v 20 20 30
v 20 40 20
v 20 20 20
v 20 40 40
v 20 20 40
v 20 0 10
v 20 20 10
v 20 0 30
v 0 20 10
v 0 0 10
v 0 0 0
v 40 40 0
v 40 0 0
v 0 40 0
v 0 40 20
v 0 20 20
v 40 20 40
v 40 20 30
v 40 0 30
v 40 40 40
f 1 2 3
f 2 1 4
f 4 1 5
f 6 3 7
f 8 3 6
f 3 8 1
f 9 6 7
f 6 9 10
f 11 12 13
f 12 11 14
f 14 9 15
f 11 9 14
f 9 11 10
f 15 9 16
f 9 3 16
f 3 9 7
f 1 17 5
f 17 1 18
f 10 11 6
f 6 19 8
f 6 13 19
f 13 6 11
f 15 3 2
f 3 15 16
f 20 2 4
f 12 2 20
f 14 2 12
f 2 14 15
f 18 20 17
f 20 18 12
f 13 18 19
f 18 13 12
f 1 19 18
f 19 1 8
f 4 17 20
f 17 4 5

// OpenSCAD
cube([20,20,10]);
translate([0,20,0])
cube([20,20,20]);
translate([20,0,0])
cube([20,20,30]);
translate([20,20,0])
cube([20,20,40]);
